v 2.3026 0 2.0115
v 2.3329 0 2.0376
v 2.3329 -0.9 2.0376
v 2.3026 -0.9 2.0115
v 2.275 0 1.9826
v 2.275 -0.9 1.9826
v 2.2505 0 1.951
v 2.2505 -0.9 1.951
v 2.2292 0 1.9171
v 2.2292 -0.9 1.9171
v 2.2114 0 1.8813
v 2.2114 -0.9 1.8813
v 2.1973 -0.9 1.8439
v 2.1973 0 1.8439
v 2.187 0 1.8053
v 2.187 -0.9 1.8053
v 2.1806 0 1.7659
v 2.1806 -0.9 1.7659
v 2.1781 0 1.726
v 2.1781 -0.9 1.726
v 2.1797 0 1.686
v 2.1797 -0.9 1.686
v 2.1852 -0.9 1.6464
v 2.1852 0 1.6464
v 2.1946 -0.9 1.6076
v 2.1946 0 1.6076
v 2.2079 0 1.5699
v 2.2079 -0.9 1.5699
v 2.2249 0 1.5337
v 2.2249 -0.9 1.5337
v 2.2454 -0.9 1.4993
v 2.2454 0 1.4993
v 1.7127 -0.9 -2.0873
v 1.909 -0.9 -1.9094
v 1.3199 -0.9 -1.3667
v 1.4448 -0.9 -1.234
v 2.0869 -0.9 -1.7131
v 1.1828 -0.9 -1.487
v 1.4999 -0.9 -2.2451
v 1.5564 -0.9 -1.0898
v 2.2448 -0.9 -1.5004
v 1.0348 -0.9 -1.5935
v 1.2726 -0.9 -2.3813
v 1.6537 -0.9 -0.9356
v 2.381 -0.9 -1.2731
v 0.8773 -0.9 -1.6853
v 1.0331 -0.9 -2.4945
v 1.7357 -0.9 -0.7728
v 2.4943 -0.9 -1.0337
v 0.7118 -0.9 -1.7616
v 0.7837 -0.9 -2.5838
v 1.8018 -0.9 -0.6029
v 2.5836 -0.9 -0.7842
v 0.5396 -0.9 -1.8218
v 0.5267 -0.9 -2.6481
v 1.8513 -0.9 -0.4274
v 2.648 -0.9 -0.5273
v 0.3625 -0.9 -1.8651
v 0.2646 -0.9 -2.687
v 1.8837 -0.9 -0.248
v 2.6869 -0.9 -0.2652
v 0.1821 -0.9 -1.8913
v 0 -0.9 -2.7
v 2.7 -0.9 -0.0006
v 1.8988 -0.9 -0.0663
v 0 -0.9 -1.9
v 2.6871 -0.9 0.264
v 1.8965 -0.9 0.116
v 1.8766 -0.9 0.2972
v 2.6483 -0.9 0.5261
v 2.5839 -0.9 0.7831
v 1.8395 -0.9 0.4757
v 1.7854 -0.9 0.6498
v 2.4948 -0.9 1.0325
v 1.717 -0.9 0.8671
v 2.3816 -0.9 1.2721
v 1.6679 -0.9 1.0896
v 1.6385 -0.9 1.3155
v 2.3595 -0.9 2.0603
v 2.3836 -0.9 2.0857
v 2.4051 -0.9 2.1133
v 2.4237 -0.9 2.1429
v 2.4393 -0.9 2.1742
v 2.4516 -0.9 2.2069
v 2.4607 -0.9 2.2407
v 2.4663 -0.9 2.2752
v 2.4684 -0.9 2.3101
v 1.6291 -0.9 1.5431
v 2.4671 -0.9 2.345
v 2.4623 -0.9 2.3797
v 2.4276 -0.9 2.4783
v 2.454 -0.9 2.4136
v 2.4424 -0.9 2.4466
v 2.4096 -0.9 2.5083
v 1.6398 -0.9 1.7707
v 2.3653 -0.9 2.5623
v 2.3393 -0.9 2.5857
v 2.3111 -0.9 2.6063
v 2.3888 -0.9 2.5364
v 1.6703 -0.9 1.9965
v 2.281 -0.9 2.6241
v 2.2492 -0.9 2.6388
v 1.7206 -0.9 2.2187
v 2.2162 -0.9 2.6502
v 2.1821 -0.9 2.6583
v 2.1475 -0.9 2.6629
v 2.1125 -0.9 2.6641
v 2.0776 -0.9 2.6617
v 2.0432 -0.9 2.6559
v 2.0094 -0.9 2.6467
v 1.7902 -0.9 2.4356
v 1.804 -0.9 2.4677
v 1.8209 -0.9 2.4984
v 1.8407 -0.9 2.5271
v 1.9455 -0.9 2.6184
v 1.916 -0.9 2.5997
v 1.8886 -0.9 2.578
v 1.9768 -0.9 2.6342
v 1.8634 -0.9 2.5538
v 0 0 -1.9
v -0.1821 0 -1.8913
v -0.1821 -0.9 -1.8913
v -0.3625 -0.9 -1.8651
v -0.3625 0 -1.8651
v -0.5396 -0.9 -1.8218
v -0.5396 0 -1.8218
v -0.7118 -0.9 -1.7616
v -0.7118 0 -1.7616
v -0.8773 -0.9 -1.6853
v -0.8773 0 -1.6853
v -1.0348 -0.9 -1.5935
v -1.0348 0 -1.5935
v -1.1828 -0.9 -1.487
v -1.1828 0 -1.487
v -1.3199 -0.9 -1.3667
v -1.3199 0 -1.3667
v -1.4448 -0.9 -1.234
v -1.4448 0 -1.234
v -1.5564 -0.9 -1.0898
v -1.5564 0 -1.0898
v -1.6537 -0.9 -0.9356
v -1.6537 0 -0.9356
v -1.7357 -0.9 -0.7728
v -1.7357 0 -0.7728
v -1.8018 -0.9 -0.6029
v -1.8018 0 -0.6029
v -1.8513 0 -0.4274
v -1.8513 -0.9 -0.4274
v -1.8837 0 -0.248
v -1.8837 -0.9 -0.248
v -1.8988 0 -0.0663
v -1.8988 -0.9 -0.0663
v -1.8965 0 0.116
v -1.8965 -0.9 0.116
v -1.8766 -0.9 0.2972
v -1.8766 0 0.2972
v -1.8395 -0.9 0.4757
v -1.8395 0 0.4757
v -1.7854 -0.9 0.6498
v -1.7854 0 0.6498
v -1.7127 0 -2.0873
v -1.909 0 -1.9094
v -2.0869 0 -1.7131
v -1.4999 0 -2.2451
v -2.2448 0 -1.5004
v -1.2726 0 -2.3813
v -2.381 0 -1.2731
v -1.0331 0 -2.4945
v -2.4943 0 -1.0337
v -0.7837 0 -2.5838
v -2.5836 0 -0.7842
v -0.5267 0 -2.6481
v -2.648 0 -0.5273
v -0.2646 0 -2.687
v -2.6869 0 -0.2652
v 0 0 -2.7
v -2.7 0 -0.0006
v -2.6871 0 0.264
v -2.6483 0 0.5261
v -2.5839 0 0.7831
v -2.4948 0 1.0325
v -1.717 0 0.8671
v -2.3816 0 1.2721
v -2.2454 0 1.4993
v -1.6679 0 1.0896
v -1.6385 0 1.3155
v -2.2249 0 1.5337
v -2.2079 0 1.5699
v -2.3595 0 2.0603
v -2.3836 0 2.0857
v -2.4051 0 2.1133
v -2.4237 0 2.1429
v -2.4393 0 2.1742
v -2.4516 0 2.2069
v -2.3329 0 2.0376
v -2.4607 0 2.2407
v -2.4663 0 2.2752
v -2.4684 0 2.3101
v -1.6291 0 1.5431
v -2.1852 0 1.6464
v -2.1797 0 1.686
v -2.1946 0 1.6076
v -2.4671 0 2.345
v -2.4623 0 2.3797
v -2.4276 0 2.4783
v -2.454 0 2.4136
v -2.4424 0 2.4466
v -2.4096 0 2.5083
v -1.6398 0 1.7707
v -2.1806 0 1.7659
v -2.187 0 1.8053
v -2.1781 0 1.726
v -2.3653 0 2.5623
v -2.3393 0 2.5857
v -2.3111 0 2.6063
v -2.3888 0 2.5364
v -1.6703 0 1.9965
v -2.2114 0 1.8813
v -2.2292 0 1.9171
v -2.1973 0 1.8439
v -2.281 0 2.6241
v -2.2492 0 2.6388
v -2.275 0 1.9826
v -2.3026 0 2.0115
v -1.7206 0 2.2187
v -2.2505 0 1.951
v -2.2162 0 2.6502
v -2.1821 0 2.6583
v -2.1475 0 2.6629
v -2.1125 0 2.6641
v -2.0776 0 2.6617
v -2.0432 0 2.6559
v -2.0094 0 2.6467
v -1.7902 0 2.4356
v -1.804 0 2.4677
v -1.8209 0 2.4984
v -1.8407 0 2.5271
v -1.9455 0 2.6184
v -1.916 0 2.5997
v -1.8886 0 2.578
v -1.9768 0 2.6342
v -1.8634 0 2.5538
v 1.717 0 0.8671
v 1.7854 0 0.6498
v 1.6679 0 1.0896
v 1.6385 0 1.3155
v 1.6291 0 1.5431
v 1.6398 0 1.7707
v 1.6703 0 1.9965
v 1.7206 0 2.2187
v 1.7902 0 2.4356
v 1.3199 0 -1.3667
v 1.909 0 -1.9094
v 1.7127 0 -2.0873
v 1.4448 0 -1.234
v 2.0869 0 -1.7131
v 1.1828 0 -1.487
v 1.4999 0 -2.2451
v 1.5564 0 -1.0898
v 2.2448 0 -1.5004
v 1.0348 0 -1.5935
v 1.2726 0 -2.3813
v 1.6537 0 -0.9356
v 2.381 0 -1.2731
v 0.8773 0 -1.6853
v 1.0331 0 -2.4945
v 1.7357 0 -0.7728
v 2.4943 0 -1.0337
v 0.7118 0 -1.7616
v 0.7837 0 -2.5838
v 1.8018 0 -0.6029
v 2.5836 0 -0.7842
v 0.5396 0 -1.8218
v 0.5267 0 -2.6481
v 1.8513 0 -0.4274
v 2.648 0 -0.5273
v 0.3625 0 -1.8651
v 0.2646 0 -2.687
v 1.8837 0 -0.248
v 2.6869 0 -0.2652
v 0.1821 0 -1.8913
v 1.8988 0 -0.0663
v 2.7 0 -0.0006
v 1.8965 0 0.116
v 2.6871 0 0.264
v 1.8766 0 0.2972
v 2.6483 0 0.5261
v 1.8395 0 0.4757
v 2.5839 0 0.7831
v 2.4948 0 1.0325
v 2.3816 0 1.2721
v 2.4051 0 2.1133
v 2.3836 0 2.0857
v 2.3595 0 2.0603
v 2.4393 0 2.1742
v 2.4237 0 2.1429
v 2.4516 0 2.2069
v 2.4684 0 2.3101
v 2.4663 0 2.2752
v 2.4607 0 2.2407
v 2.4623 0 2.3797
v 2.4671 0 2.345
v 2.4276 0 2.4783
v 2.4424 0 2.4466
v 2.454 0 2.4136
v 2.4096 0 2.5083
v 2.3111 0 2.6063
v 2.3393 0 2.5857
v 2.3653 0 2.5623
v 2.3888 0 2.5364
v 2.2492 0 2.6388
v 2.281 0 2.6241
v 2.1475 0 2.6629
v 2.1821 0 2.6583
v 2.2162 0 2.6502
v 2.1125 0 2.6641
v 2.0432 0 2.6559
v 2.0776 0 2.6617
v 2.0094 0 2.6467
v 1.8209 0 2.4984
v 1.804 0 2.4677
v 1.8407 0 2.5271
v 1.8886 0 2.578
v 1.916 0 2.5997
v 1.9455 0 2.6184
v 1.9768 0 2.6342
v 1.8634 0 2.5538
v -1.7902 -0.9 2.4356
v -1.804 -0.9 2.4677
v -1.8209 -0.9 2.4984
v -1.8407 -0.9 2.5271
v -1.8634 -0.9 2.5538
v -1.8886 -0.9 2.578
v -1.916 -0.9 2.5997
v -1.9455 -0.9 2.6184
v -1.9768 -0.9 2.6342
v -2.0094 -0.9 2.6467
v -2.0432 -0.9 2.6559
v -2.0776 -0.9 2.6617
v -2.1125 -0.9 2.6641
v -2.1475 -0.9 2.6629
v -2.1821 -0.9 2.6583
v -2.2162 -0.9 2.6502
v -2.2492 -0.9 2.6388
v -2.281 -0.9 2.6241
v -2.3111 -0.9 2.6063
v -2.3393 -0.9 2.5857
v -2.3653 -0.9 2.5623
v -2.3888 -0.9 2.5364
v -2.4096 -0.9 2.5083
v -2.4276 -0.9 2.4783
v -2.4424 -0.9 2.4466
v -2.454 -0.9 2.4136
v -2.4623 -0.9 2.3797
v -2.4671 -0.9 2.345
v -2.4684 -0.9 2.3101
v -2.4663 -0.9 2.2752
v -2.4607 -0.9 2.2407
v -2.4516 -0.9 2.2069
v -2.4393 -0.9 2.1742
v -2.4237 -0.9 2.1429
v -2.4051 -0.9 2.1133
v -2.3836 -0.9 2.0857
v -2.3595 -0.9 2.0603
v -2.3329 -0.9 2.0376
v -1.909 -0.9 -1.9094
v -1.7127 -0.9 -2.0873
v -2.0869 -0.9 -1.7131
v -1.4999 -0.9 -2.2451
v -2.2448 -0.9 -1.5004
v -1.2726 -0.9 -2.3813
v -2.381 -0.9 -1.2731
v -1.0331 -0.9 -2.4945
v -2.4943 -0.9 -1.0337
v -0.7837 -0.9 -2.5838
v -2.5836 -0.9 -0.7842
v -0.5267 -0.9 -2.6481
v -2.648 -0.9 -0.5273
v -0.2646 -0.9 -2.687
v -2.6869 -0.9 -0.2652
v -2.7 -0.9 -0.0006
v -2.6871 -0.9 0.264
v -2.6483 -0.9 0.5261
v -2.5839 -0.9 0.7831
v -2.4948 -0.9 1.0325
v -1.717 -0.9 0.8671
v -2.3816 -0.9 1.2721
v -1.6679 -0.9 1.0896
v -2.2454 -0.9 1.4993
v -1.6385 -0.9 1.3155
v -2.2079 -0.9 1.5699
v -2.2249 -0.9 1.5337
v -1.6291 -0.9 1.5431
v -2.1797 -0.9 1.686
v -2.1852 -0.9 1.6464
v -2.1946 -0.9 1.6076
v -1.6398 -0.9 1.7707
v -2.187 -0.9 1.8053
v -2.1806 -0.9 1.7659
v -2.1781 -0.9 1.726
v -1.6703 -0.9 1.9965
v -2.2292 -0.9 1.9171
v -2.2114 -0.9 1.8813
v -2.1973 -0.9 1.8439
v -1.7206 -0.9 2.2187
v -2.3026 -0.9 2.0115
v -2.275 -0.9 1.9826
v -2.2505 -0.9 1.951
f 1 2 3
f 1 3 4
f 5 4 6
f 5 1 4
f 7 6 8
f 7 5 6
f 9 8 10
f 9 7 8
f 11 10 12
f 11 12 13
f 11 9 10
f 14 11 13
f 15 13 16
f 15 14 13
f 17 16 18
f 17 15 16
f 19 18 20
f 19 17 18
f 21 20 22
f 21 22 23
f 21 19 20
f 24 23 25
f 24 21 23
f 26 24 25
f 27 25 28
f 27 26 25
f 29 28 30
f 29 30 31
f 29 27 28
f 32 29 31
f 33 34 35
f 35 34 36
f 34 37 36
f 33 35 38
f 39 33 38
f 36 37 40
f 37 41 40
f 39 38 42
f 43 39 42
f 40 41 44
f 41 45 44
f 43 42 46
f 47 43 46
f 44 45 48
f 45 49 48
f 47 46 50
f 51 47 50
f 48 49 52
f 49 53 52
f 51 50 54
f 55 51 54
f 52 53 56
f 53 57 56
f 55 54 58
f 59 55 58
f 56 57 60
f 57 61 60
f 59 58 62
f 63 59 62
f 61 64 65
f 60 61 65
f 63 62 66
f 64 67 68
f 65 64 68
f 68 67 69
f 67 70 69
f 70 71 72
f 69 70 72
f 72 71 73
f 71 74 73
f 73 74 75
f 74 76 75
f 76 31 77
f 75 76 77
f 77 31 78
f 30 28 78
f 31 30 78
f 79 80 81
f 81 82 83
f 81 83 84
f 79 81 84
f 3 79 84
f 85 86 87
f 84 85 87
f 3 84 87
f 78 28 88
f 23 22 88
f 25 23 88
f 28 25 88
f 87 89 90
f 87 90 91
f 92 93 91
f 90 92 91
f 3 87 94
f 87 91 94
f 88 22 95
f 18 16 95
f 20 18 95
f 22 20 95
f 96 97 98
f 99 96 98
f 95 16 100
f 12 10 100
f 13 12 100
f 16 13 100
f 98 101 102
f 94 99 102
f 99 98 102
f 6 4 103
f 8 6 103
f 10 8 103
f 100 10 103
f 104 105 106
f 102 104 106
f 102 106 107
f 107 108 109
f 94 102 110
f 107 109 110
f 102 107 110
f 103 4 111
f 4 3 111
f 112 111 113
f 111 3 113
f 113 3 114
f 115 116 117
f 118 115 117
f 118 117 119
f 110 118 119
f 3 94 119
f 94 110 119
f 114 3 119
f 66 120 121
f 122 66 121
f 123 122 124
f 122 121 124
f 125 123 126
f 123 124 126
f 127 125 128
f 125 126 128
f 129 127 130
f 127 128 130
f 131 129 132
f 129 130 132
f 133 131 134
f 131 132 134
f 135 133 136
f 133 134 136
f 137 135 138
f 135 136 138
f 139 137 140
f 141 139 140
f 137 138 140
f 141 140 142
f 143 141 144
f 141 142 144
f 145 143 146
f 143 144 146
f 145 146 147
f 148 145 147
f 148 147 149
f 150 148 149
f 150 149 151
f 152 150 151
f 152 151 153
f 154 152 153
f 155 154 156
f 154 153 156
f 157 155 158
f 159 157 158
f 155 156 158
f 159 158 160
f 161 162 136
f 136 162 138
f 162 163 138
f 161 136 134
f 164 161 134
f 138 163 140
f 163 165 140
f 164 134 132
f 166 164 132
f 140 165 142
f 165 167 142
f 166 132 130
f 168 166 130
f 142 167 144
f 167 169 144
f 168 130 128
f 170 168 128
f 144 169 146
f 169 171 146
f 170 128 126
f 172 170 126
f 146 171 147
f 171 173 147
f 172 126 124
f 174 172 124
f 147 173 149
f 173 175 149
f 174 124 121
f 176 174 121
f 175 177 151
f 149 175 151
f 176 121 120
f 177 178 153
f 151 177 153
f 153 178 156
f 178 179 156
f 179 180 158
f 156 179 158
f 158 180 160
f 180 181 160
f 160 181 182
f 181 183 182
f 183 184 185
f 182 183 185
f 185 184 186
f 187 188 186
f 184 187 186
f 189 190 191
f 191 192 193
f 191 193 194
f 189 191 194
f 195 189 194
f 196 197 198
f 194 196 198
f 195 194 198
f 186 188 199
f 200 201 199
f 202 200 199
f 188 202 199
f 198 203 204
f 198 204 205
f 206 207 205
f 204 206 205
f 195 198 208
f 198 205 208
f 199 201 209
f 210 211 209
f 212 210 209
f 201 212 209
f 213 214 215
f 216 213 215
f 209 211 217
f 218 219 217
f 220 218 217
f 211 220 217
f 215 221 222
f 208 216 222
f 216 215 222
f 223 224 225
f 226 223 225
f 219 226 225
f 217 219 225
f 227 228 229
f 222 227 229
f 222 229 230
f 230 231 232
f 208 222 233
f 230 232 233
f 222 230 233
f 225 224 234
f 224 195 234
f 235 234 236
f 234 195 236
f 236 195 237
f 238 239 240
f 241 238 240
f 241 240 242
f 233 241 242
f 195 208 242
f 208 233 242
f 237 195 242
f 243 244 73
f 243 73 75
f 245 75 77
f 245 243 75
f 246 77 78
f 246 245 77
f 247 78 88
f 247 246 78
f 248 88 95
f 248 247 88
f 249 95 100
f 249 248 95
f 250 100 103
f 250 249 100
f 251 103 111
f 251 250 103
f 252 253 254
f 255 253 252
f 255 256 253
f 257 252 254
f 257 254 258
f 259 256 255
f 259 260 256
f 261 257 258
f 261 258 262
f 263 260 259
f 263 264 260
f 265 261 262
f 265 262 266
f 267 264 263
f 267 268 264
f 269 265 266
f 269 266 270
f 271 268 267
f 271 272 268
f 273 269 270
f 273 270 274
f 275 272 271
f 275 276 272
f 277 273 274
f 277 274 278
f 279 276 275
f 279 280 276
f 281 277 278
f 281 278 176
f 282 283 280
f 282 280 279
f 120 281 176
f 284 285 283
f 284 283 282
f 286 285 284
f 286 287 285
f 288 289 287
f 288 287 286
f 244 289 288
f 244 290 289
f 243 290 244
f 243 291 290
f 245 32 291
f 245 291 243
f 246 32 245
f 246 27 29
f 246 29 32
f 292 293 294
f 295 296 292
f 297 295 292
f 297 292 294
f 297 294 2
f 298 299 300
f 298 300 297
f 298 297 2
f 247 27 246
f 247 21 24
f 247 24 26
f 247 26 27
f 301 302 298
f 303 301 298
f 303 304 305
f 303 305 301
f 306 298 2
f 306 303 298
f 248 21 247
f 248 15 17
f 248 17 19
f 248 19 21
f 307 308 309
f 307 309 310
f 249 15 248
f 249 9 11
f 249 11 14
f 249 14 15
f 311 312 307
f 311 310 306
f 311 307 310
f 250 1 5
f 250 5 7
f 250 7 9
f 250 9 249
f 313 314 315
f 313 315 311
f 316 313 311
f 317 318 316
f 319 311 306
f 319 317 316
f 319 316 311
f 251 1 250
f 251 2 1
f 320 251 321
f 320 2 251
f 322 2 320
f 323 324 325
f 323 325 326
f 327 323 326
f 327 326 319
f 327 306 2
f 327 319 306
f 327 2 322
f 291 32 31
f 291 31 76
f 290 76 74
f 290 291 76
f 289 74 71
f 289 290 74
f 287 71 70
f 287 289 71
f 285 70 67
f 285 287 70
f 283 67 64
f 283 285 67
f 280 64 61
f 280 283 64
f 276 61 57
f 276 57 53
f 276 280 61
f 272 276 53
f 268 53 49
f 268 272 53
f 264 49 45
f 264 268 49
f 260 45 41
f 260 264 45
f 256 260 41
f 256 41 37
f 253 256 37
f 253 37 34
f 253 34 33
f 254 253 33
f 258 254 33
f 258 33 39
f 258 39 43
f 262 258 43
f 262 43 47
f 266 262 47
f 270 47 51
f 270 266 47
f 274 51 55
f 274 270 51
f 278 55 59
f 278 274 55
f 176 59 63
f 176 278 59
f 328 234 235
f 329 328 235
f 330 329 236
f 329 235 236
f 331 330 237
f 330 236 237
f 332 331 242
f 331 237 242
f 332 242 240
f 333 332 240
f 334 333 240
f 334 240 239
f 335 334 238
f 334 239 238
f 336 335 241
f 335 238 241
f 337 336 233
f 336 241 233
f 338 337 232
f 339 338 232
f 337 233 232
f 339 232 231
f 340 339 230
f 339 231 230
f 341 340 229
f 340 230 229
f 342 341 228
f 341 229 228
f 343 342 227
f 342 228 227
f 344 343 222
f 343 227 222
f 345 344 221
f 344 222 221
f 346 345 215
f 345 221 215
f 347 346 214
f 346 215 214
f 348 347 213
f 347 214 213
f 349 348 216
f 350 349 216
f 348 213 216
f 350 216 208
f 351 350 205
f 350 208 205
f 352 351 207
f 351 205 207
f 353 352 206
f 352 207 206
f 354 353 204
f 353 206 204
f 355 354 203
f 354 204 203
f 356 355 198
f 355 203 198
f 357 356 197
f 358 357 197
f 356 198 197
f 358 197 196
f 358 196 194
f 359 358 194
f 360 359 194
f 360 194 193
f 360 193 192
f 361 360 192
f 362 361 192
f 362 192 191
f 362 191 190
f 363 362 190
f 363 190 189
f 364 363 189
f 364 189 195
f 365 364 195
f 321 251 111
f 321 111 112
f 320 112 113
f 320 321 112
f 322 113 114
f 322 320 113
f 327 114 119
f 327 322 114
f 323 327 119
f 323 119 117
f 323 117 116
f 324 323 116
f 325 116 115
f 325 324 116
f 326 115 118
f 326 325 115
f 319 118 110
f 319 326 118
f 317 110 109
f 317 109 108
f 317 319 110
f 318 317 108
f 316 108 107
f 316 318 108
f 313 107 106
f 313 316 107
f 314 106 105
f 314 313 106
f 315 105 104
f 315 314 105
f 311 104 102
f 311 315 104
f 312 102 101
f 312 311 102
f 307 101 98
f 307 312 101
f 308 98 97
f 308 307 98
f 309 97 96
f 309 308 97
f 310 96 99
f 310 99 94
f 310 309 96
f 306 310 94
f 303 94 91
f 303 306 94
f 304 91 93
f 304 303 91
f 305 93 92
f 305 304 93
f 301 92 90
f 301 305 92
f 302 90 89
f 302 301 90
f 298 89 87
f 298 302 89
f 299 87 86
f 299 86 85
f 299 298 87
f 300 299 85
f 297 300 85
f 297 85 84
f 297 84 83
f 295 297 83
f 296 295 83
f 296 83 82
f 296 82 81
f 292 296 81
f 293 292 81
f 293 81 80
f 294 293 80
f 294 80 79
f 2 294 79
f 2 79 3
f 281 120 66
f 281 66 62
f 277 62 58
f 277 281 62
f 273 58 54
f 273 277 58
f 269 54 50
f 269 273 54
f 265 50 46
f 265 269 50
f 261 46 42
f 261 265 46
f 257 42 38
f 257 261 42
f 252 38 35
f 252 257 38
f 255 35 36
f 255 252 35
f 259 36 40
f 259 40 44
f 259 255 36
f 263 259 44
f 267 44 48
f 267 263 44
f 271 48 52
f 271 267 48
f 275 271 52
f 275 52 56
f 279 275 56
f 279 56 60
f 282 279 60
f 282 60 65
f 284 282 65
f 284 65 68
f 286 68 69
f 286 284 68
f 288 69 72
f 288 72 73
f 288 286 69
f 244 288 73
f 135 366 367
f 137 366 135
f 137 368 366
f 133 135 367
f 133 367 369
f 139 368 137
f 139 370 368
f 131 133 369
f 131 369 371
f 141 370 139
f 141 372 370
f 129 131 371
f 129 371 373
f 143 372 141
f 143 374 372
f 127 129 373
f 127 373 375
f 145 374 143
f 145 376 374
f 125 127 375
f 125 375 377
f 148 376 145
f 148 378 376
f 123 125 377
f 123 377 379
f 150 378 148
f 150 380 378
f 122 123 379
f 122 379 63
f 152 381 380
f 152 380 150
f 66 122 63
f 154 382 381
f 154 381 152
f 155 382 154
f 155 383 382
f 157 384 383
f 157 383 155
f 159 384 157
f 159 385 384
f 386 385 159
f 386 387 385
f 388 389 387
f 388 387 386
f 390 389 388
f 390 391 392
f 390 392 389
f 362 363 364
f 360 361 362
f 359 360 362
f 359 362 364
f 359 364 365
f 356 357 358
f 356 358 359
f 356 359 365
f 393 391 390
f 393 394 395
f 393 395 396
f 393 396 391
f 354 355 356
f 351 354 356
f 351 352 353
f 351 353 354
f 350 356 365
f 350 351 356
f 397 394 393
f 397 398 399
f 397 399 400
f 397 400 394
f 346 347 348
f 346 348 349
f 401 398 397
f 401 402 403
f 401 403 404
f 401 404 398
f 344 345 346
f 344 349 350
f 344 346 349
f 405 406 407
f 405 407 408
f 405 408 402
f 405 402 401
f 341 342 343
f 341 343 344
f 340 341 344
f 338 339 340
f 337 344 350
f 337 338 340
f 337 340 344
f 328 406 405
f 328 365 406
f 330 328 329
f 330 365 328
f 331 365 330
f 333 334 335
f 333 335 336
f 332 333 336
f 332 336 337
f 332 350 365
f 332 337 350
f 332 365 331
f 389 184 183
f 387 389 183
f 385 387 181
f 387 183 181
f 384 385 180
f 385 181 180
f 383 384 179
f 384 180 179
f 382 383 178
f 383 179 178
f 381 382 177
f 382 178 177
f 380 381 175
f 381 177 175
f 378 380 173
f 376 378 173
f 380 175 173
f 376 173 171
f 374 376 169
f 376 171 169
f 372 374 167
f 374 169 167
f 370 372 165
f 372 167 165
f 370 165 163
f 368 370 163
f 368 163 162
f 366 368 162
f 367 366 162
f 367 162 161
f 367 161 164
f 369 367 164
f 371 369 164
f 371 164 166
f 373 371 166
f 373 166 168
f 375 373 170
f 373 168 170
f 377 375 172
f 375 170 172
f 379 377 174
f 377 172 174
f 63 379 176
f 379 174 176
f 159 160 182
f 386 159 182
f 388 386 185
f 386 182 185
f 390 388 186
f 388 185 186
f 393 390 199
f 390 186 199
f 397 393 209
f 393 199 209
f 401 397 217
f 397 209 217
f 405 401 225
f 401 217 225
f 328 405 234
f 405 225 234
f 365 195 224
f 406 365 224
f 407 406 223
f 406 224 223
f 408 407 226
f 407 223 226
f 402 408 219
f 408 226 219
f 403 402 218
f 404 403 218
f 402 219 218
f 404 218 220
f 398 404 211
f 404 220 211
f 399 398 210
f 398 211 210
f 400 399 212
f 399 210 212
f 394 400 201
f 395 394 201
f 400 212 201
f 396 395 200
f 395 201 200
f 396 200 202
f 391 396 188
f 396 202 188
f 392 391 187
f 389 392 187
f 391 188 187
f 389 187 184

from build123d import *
from build123d import SkipClean  # not in build123d's __all__

# Parameters (mm, degrees)
F1_DEPTH = 0.9


with BuildPart() as f1:
    # F0 (on Front) → F1 (new body)
    with BuildSketch(Plane.XZ):
        with BuildLine():
            ThreePointArc((-1.7854159795, 0.6498382723), (-1.6291374554, 1.5431391957), (-1.7902040585, 2.4355892314))
            ThreePointArc((-1.7902040585, 2.4355892314), (-2.3254361147, 2.5963553546), (-2.3329475668, 2.0375506674))
            ThreePointArc((-2.3329475668, 2.0375506674), (-2.1832734878, 1.7856710143), (-2.2454313543, 1.4993458684))
            ThreePointArc((-2.2454313543, 1.4993458684), (-2.3809907439, -1.2731390645), (0, -2.7))
            Line((0, -2.7), (0, -1.9))
            ThreePointArc((0, -1.9), (-1.5563888841, -1.0897952291), (-1.7854159795, 0.6498382723))
        make_face()
    extrude(amount=F1_DEPTH)

    # F2: F1 across plane


with BuildPart() as f1_1:
    add(f1.part, clean=False)
    with SkipClean():  # cleaning this boolean's faces spoils the solid; the shape is the same uncleaned
        add(f1.part.mirror(Plane.YZ), clean=False)


solid = f1_1.part
